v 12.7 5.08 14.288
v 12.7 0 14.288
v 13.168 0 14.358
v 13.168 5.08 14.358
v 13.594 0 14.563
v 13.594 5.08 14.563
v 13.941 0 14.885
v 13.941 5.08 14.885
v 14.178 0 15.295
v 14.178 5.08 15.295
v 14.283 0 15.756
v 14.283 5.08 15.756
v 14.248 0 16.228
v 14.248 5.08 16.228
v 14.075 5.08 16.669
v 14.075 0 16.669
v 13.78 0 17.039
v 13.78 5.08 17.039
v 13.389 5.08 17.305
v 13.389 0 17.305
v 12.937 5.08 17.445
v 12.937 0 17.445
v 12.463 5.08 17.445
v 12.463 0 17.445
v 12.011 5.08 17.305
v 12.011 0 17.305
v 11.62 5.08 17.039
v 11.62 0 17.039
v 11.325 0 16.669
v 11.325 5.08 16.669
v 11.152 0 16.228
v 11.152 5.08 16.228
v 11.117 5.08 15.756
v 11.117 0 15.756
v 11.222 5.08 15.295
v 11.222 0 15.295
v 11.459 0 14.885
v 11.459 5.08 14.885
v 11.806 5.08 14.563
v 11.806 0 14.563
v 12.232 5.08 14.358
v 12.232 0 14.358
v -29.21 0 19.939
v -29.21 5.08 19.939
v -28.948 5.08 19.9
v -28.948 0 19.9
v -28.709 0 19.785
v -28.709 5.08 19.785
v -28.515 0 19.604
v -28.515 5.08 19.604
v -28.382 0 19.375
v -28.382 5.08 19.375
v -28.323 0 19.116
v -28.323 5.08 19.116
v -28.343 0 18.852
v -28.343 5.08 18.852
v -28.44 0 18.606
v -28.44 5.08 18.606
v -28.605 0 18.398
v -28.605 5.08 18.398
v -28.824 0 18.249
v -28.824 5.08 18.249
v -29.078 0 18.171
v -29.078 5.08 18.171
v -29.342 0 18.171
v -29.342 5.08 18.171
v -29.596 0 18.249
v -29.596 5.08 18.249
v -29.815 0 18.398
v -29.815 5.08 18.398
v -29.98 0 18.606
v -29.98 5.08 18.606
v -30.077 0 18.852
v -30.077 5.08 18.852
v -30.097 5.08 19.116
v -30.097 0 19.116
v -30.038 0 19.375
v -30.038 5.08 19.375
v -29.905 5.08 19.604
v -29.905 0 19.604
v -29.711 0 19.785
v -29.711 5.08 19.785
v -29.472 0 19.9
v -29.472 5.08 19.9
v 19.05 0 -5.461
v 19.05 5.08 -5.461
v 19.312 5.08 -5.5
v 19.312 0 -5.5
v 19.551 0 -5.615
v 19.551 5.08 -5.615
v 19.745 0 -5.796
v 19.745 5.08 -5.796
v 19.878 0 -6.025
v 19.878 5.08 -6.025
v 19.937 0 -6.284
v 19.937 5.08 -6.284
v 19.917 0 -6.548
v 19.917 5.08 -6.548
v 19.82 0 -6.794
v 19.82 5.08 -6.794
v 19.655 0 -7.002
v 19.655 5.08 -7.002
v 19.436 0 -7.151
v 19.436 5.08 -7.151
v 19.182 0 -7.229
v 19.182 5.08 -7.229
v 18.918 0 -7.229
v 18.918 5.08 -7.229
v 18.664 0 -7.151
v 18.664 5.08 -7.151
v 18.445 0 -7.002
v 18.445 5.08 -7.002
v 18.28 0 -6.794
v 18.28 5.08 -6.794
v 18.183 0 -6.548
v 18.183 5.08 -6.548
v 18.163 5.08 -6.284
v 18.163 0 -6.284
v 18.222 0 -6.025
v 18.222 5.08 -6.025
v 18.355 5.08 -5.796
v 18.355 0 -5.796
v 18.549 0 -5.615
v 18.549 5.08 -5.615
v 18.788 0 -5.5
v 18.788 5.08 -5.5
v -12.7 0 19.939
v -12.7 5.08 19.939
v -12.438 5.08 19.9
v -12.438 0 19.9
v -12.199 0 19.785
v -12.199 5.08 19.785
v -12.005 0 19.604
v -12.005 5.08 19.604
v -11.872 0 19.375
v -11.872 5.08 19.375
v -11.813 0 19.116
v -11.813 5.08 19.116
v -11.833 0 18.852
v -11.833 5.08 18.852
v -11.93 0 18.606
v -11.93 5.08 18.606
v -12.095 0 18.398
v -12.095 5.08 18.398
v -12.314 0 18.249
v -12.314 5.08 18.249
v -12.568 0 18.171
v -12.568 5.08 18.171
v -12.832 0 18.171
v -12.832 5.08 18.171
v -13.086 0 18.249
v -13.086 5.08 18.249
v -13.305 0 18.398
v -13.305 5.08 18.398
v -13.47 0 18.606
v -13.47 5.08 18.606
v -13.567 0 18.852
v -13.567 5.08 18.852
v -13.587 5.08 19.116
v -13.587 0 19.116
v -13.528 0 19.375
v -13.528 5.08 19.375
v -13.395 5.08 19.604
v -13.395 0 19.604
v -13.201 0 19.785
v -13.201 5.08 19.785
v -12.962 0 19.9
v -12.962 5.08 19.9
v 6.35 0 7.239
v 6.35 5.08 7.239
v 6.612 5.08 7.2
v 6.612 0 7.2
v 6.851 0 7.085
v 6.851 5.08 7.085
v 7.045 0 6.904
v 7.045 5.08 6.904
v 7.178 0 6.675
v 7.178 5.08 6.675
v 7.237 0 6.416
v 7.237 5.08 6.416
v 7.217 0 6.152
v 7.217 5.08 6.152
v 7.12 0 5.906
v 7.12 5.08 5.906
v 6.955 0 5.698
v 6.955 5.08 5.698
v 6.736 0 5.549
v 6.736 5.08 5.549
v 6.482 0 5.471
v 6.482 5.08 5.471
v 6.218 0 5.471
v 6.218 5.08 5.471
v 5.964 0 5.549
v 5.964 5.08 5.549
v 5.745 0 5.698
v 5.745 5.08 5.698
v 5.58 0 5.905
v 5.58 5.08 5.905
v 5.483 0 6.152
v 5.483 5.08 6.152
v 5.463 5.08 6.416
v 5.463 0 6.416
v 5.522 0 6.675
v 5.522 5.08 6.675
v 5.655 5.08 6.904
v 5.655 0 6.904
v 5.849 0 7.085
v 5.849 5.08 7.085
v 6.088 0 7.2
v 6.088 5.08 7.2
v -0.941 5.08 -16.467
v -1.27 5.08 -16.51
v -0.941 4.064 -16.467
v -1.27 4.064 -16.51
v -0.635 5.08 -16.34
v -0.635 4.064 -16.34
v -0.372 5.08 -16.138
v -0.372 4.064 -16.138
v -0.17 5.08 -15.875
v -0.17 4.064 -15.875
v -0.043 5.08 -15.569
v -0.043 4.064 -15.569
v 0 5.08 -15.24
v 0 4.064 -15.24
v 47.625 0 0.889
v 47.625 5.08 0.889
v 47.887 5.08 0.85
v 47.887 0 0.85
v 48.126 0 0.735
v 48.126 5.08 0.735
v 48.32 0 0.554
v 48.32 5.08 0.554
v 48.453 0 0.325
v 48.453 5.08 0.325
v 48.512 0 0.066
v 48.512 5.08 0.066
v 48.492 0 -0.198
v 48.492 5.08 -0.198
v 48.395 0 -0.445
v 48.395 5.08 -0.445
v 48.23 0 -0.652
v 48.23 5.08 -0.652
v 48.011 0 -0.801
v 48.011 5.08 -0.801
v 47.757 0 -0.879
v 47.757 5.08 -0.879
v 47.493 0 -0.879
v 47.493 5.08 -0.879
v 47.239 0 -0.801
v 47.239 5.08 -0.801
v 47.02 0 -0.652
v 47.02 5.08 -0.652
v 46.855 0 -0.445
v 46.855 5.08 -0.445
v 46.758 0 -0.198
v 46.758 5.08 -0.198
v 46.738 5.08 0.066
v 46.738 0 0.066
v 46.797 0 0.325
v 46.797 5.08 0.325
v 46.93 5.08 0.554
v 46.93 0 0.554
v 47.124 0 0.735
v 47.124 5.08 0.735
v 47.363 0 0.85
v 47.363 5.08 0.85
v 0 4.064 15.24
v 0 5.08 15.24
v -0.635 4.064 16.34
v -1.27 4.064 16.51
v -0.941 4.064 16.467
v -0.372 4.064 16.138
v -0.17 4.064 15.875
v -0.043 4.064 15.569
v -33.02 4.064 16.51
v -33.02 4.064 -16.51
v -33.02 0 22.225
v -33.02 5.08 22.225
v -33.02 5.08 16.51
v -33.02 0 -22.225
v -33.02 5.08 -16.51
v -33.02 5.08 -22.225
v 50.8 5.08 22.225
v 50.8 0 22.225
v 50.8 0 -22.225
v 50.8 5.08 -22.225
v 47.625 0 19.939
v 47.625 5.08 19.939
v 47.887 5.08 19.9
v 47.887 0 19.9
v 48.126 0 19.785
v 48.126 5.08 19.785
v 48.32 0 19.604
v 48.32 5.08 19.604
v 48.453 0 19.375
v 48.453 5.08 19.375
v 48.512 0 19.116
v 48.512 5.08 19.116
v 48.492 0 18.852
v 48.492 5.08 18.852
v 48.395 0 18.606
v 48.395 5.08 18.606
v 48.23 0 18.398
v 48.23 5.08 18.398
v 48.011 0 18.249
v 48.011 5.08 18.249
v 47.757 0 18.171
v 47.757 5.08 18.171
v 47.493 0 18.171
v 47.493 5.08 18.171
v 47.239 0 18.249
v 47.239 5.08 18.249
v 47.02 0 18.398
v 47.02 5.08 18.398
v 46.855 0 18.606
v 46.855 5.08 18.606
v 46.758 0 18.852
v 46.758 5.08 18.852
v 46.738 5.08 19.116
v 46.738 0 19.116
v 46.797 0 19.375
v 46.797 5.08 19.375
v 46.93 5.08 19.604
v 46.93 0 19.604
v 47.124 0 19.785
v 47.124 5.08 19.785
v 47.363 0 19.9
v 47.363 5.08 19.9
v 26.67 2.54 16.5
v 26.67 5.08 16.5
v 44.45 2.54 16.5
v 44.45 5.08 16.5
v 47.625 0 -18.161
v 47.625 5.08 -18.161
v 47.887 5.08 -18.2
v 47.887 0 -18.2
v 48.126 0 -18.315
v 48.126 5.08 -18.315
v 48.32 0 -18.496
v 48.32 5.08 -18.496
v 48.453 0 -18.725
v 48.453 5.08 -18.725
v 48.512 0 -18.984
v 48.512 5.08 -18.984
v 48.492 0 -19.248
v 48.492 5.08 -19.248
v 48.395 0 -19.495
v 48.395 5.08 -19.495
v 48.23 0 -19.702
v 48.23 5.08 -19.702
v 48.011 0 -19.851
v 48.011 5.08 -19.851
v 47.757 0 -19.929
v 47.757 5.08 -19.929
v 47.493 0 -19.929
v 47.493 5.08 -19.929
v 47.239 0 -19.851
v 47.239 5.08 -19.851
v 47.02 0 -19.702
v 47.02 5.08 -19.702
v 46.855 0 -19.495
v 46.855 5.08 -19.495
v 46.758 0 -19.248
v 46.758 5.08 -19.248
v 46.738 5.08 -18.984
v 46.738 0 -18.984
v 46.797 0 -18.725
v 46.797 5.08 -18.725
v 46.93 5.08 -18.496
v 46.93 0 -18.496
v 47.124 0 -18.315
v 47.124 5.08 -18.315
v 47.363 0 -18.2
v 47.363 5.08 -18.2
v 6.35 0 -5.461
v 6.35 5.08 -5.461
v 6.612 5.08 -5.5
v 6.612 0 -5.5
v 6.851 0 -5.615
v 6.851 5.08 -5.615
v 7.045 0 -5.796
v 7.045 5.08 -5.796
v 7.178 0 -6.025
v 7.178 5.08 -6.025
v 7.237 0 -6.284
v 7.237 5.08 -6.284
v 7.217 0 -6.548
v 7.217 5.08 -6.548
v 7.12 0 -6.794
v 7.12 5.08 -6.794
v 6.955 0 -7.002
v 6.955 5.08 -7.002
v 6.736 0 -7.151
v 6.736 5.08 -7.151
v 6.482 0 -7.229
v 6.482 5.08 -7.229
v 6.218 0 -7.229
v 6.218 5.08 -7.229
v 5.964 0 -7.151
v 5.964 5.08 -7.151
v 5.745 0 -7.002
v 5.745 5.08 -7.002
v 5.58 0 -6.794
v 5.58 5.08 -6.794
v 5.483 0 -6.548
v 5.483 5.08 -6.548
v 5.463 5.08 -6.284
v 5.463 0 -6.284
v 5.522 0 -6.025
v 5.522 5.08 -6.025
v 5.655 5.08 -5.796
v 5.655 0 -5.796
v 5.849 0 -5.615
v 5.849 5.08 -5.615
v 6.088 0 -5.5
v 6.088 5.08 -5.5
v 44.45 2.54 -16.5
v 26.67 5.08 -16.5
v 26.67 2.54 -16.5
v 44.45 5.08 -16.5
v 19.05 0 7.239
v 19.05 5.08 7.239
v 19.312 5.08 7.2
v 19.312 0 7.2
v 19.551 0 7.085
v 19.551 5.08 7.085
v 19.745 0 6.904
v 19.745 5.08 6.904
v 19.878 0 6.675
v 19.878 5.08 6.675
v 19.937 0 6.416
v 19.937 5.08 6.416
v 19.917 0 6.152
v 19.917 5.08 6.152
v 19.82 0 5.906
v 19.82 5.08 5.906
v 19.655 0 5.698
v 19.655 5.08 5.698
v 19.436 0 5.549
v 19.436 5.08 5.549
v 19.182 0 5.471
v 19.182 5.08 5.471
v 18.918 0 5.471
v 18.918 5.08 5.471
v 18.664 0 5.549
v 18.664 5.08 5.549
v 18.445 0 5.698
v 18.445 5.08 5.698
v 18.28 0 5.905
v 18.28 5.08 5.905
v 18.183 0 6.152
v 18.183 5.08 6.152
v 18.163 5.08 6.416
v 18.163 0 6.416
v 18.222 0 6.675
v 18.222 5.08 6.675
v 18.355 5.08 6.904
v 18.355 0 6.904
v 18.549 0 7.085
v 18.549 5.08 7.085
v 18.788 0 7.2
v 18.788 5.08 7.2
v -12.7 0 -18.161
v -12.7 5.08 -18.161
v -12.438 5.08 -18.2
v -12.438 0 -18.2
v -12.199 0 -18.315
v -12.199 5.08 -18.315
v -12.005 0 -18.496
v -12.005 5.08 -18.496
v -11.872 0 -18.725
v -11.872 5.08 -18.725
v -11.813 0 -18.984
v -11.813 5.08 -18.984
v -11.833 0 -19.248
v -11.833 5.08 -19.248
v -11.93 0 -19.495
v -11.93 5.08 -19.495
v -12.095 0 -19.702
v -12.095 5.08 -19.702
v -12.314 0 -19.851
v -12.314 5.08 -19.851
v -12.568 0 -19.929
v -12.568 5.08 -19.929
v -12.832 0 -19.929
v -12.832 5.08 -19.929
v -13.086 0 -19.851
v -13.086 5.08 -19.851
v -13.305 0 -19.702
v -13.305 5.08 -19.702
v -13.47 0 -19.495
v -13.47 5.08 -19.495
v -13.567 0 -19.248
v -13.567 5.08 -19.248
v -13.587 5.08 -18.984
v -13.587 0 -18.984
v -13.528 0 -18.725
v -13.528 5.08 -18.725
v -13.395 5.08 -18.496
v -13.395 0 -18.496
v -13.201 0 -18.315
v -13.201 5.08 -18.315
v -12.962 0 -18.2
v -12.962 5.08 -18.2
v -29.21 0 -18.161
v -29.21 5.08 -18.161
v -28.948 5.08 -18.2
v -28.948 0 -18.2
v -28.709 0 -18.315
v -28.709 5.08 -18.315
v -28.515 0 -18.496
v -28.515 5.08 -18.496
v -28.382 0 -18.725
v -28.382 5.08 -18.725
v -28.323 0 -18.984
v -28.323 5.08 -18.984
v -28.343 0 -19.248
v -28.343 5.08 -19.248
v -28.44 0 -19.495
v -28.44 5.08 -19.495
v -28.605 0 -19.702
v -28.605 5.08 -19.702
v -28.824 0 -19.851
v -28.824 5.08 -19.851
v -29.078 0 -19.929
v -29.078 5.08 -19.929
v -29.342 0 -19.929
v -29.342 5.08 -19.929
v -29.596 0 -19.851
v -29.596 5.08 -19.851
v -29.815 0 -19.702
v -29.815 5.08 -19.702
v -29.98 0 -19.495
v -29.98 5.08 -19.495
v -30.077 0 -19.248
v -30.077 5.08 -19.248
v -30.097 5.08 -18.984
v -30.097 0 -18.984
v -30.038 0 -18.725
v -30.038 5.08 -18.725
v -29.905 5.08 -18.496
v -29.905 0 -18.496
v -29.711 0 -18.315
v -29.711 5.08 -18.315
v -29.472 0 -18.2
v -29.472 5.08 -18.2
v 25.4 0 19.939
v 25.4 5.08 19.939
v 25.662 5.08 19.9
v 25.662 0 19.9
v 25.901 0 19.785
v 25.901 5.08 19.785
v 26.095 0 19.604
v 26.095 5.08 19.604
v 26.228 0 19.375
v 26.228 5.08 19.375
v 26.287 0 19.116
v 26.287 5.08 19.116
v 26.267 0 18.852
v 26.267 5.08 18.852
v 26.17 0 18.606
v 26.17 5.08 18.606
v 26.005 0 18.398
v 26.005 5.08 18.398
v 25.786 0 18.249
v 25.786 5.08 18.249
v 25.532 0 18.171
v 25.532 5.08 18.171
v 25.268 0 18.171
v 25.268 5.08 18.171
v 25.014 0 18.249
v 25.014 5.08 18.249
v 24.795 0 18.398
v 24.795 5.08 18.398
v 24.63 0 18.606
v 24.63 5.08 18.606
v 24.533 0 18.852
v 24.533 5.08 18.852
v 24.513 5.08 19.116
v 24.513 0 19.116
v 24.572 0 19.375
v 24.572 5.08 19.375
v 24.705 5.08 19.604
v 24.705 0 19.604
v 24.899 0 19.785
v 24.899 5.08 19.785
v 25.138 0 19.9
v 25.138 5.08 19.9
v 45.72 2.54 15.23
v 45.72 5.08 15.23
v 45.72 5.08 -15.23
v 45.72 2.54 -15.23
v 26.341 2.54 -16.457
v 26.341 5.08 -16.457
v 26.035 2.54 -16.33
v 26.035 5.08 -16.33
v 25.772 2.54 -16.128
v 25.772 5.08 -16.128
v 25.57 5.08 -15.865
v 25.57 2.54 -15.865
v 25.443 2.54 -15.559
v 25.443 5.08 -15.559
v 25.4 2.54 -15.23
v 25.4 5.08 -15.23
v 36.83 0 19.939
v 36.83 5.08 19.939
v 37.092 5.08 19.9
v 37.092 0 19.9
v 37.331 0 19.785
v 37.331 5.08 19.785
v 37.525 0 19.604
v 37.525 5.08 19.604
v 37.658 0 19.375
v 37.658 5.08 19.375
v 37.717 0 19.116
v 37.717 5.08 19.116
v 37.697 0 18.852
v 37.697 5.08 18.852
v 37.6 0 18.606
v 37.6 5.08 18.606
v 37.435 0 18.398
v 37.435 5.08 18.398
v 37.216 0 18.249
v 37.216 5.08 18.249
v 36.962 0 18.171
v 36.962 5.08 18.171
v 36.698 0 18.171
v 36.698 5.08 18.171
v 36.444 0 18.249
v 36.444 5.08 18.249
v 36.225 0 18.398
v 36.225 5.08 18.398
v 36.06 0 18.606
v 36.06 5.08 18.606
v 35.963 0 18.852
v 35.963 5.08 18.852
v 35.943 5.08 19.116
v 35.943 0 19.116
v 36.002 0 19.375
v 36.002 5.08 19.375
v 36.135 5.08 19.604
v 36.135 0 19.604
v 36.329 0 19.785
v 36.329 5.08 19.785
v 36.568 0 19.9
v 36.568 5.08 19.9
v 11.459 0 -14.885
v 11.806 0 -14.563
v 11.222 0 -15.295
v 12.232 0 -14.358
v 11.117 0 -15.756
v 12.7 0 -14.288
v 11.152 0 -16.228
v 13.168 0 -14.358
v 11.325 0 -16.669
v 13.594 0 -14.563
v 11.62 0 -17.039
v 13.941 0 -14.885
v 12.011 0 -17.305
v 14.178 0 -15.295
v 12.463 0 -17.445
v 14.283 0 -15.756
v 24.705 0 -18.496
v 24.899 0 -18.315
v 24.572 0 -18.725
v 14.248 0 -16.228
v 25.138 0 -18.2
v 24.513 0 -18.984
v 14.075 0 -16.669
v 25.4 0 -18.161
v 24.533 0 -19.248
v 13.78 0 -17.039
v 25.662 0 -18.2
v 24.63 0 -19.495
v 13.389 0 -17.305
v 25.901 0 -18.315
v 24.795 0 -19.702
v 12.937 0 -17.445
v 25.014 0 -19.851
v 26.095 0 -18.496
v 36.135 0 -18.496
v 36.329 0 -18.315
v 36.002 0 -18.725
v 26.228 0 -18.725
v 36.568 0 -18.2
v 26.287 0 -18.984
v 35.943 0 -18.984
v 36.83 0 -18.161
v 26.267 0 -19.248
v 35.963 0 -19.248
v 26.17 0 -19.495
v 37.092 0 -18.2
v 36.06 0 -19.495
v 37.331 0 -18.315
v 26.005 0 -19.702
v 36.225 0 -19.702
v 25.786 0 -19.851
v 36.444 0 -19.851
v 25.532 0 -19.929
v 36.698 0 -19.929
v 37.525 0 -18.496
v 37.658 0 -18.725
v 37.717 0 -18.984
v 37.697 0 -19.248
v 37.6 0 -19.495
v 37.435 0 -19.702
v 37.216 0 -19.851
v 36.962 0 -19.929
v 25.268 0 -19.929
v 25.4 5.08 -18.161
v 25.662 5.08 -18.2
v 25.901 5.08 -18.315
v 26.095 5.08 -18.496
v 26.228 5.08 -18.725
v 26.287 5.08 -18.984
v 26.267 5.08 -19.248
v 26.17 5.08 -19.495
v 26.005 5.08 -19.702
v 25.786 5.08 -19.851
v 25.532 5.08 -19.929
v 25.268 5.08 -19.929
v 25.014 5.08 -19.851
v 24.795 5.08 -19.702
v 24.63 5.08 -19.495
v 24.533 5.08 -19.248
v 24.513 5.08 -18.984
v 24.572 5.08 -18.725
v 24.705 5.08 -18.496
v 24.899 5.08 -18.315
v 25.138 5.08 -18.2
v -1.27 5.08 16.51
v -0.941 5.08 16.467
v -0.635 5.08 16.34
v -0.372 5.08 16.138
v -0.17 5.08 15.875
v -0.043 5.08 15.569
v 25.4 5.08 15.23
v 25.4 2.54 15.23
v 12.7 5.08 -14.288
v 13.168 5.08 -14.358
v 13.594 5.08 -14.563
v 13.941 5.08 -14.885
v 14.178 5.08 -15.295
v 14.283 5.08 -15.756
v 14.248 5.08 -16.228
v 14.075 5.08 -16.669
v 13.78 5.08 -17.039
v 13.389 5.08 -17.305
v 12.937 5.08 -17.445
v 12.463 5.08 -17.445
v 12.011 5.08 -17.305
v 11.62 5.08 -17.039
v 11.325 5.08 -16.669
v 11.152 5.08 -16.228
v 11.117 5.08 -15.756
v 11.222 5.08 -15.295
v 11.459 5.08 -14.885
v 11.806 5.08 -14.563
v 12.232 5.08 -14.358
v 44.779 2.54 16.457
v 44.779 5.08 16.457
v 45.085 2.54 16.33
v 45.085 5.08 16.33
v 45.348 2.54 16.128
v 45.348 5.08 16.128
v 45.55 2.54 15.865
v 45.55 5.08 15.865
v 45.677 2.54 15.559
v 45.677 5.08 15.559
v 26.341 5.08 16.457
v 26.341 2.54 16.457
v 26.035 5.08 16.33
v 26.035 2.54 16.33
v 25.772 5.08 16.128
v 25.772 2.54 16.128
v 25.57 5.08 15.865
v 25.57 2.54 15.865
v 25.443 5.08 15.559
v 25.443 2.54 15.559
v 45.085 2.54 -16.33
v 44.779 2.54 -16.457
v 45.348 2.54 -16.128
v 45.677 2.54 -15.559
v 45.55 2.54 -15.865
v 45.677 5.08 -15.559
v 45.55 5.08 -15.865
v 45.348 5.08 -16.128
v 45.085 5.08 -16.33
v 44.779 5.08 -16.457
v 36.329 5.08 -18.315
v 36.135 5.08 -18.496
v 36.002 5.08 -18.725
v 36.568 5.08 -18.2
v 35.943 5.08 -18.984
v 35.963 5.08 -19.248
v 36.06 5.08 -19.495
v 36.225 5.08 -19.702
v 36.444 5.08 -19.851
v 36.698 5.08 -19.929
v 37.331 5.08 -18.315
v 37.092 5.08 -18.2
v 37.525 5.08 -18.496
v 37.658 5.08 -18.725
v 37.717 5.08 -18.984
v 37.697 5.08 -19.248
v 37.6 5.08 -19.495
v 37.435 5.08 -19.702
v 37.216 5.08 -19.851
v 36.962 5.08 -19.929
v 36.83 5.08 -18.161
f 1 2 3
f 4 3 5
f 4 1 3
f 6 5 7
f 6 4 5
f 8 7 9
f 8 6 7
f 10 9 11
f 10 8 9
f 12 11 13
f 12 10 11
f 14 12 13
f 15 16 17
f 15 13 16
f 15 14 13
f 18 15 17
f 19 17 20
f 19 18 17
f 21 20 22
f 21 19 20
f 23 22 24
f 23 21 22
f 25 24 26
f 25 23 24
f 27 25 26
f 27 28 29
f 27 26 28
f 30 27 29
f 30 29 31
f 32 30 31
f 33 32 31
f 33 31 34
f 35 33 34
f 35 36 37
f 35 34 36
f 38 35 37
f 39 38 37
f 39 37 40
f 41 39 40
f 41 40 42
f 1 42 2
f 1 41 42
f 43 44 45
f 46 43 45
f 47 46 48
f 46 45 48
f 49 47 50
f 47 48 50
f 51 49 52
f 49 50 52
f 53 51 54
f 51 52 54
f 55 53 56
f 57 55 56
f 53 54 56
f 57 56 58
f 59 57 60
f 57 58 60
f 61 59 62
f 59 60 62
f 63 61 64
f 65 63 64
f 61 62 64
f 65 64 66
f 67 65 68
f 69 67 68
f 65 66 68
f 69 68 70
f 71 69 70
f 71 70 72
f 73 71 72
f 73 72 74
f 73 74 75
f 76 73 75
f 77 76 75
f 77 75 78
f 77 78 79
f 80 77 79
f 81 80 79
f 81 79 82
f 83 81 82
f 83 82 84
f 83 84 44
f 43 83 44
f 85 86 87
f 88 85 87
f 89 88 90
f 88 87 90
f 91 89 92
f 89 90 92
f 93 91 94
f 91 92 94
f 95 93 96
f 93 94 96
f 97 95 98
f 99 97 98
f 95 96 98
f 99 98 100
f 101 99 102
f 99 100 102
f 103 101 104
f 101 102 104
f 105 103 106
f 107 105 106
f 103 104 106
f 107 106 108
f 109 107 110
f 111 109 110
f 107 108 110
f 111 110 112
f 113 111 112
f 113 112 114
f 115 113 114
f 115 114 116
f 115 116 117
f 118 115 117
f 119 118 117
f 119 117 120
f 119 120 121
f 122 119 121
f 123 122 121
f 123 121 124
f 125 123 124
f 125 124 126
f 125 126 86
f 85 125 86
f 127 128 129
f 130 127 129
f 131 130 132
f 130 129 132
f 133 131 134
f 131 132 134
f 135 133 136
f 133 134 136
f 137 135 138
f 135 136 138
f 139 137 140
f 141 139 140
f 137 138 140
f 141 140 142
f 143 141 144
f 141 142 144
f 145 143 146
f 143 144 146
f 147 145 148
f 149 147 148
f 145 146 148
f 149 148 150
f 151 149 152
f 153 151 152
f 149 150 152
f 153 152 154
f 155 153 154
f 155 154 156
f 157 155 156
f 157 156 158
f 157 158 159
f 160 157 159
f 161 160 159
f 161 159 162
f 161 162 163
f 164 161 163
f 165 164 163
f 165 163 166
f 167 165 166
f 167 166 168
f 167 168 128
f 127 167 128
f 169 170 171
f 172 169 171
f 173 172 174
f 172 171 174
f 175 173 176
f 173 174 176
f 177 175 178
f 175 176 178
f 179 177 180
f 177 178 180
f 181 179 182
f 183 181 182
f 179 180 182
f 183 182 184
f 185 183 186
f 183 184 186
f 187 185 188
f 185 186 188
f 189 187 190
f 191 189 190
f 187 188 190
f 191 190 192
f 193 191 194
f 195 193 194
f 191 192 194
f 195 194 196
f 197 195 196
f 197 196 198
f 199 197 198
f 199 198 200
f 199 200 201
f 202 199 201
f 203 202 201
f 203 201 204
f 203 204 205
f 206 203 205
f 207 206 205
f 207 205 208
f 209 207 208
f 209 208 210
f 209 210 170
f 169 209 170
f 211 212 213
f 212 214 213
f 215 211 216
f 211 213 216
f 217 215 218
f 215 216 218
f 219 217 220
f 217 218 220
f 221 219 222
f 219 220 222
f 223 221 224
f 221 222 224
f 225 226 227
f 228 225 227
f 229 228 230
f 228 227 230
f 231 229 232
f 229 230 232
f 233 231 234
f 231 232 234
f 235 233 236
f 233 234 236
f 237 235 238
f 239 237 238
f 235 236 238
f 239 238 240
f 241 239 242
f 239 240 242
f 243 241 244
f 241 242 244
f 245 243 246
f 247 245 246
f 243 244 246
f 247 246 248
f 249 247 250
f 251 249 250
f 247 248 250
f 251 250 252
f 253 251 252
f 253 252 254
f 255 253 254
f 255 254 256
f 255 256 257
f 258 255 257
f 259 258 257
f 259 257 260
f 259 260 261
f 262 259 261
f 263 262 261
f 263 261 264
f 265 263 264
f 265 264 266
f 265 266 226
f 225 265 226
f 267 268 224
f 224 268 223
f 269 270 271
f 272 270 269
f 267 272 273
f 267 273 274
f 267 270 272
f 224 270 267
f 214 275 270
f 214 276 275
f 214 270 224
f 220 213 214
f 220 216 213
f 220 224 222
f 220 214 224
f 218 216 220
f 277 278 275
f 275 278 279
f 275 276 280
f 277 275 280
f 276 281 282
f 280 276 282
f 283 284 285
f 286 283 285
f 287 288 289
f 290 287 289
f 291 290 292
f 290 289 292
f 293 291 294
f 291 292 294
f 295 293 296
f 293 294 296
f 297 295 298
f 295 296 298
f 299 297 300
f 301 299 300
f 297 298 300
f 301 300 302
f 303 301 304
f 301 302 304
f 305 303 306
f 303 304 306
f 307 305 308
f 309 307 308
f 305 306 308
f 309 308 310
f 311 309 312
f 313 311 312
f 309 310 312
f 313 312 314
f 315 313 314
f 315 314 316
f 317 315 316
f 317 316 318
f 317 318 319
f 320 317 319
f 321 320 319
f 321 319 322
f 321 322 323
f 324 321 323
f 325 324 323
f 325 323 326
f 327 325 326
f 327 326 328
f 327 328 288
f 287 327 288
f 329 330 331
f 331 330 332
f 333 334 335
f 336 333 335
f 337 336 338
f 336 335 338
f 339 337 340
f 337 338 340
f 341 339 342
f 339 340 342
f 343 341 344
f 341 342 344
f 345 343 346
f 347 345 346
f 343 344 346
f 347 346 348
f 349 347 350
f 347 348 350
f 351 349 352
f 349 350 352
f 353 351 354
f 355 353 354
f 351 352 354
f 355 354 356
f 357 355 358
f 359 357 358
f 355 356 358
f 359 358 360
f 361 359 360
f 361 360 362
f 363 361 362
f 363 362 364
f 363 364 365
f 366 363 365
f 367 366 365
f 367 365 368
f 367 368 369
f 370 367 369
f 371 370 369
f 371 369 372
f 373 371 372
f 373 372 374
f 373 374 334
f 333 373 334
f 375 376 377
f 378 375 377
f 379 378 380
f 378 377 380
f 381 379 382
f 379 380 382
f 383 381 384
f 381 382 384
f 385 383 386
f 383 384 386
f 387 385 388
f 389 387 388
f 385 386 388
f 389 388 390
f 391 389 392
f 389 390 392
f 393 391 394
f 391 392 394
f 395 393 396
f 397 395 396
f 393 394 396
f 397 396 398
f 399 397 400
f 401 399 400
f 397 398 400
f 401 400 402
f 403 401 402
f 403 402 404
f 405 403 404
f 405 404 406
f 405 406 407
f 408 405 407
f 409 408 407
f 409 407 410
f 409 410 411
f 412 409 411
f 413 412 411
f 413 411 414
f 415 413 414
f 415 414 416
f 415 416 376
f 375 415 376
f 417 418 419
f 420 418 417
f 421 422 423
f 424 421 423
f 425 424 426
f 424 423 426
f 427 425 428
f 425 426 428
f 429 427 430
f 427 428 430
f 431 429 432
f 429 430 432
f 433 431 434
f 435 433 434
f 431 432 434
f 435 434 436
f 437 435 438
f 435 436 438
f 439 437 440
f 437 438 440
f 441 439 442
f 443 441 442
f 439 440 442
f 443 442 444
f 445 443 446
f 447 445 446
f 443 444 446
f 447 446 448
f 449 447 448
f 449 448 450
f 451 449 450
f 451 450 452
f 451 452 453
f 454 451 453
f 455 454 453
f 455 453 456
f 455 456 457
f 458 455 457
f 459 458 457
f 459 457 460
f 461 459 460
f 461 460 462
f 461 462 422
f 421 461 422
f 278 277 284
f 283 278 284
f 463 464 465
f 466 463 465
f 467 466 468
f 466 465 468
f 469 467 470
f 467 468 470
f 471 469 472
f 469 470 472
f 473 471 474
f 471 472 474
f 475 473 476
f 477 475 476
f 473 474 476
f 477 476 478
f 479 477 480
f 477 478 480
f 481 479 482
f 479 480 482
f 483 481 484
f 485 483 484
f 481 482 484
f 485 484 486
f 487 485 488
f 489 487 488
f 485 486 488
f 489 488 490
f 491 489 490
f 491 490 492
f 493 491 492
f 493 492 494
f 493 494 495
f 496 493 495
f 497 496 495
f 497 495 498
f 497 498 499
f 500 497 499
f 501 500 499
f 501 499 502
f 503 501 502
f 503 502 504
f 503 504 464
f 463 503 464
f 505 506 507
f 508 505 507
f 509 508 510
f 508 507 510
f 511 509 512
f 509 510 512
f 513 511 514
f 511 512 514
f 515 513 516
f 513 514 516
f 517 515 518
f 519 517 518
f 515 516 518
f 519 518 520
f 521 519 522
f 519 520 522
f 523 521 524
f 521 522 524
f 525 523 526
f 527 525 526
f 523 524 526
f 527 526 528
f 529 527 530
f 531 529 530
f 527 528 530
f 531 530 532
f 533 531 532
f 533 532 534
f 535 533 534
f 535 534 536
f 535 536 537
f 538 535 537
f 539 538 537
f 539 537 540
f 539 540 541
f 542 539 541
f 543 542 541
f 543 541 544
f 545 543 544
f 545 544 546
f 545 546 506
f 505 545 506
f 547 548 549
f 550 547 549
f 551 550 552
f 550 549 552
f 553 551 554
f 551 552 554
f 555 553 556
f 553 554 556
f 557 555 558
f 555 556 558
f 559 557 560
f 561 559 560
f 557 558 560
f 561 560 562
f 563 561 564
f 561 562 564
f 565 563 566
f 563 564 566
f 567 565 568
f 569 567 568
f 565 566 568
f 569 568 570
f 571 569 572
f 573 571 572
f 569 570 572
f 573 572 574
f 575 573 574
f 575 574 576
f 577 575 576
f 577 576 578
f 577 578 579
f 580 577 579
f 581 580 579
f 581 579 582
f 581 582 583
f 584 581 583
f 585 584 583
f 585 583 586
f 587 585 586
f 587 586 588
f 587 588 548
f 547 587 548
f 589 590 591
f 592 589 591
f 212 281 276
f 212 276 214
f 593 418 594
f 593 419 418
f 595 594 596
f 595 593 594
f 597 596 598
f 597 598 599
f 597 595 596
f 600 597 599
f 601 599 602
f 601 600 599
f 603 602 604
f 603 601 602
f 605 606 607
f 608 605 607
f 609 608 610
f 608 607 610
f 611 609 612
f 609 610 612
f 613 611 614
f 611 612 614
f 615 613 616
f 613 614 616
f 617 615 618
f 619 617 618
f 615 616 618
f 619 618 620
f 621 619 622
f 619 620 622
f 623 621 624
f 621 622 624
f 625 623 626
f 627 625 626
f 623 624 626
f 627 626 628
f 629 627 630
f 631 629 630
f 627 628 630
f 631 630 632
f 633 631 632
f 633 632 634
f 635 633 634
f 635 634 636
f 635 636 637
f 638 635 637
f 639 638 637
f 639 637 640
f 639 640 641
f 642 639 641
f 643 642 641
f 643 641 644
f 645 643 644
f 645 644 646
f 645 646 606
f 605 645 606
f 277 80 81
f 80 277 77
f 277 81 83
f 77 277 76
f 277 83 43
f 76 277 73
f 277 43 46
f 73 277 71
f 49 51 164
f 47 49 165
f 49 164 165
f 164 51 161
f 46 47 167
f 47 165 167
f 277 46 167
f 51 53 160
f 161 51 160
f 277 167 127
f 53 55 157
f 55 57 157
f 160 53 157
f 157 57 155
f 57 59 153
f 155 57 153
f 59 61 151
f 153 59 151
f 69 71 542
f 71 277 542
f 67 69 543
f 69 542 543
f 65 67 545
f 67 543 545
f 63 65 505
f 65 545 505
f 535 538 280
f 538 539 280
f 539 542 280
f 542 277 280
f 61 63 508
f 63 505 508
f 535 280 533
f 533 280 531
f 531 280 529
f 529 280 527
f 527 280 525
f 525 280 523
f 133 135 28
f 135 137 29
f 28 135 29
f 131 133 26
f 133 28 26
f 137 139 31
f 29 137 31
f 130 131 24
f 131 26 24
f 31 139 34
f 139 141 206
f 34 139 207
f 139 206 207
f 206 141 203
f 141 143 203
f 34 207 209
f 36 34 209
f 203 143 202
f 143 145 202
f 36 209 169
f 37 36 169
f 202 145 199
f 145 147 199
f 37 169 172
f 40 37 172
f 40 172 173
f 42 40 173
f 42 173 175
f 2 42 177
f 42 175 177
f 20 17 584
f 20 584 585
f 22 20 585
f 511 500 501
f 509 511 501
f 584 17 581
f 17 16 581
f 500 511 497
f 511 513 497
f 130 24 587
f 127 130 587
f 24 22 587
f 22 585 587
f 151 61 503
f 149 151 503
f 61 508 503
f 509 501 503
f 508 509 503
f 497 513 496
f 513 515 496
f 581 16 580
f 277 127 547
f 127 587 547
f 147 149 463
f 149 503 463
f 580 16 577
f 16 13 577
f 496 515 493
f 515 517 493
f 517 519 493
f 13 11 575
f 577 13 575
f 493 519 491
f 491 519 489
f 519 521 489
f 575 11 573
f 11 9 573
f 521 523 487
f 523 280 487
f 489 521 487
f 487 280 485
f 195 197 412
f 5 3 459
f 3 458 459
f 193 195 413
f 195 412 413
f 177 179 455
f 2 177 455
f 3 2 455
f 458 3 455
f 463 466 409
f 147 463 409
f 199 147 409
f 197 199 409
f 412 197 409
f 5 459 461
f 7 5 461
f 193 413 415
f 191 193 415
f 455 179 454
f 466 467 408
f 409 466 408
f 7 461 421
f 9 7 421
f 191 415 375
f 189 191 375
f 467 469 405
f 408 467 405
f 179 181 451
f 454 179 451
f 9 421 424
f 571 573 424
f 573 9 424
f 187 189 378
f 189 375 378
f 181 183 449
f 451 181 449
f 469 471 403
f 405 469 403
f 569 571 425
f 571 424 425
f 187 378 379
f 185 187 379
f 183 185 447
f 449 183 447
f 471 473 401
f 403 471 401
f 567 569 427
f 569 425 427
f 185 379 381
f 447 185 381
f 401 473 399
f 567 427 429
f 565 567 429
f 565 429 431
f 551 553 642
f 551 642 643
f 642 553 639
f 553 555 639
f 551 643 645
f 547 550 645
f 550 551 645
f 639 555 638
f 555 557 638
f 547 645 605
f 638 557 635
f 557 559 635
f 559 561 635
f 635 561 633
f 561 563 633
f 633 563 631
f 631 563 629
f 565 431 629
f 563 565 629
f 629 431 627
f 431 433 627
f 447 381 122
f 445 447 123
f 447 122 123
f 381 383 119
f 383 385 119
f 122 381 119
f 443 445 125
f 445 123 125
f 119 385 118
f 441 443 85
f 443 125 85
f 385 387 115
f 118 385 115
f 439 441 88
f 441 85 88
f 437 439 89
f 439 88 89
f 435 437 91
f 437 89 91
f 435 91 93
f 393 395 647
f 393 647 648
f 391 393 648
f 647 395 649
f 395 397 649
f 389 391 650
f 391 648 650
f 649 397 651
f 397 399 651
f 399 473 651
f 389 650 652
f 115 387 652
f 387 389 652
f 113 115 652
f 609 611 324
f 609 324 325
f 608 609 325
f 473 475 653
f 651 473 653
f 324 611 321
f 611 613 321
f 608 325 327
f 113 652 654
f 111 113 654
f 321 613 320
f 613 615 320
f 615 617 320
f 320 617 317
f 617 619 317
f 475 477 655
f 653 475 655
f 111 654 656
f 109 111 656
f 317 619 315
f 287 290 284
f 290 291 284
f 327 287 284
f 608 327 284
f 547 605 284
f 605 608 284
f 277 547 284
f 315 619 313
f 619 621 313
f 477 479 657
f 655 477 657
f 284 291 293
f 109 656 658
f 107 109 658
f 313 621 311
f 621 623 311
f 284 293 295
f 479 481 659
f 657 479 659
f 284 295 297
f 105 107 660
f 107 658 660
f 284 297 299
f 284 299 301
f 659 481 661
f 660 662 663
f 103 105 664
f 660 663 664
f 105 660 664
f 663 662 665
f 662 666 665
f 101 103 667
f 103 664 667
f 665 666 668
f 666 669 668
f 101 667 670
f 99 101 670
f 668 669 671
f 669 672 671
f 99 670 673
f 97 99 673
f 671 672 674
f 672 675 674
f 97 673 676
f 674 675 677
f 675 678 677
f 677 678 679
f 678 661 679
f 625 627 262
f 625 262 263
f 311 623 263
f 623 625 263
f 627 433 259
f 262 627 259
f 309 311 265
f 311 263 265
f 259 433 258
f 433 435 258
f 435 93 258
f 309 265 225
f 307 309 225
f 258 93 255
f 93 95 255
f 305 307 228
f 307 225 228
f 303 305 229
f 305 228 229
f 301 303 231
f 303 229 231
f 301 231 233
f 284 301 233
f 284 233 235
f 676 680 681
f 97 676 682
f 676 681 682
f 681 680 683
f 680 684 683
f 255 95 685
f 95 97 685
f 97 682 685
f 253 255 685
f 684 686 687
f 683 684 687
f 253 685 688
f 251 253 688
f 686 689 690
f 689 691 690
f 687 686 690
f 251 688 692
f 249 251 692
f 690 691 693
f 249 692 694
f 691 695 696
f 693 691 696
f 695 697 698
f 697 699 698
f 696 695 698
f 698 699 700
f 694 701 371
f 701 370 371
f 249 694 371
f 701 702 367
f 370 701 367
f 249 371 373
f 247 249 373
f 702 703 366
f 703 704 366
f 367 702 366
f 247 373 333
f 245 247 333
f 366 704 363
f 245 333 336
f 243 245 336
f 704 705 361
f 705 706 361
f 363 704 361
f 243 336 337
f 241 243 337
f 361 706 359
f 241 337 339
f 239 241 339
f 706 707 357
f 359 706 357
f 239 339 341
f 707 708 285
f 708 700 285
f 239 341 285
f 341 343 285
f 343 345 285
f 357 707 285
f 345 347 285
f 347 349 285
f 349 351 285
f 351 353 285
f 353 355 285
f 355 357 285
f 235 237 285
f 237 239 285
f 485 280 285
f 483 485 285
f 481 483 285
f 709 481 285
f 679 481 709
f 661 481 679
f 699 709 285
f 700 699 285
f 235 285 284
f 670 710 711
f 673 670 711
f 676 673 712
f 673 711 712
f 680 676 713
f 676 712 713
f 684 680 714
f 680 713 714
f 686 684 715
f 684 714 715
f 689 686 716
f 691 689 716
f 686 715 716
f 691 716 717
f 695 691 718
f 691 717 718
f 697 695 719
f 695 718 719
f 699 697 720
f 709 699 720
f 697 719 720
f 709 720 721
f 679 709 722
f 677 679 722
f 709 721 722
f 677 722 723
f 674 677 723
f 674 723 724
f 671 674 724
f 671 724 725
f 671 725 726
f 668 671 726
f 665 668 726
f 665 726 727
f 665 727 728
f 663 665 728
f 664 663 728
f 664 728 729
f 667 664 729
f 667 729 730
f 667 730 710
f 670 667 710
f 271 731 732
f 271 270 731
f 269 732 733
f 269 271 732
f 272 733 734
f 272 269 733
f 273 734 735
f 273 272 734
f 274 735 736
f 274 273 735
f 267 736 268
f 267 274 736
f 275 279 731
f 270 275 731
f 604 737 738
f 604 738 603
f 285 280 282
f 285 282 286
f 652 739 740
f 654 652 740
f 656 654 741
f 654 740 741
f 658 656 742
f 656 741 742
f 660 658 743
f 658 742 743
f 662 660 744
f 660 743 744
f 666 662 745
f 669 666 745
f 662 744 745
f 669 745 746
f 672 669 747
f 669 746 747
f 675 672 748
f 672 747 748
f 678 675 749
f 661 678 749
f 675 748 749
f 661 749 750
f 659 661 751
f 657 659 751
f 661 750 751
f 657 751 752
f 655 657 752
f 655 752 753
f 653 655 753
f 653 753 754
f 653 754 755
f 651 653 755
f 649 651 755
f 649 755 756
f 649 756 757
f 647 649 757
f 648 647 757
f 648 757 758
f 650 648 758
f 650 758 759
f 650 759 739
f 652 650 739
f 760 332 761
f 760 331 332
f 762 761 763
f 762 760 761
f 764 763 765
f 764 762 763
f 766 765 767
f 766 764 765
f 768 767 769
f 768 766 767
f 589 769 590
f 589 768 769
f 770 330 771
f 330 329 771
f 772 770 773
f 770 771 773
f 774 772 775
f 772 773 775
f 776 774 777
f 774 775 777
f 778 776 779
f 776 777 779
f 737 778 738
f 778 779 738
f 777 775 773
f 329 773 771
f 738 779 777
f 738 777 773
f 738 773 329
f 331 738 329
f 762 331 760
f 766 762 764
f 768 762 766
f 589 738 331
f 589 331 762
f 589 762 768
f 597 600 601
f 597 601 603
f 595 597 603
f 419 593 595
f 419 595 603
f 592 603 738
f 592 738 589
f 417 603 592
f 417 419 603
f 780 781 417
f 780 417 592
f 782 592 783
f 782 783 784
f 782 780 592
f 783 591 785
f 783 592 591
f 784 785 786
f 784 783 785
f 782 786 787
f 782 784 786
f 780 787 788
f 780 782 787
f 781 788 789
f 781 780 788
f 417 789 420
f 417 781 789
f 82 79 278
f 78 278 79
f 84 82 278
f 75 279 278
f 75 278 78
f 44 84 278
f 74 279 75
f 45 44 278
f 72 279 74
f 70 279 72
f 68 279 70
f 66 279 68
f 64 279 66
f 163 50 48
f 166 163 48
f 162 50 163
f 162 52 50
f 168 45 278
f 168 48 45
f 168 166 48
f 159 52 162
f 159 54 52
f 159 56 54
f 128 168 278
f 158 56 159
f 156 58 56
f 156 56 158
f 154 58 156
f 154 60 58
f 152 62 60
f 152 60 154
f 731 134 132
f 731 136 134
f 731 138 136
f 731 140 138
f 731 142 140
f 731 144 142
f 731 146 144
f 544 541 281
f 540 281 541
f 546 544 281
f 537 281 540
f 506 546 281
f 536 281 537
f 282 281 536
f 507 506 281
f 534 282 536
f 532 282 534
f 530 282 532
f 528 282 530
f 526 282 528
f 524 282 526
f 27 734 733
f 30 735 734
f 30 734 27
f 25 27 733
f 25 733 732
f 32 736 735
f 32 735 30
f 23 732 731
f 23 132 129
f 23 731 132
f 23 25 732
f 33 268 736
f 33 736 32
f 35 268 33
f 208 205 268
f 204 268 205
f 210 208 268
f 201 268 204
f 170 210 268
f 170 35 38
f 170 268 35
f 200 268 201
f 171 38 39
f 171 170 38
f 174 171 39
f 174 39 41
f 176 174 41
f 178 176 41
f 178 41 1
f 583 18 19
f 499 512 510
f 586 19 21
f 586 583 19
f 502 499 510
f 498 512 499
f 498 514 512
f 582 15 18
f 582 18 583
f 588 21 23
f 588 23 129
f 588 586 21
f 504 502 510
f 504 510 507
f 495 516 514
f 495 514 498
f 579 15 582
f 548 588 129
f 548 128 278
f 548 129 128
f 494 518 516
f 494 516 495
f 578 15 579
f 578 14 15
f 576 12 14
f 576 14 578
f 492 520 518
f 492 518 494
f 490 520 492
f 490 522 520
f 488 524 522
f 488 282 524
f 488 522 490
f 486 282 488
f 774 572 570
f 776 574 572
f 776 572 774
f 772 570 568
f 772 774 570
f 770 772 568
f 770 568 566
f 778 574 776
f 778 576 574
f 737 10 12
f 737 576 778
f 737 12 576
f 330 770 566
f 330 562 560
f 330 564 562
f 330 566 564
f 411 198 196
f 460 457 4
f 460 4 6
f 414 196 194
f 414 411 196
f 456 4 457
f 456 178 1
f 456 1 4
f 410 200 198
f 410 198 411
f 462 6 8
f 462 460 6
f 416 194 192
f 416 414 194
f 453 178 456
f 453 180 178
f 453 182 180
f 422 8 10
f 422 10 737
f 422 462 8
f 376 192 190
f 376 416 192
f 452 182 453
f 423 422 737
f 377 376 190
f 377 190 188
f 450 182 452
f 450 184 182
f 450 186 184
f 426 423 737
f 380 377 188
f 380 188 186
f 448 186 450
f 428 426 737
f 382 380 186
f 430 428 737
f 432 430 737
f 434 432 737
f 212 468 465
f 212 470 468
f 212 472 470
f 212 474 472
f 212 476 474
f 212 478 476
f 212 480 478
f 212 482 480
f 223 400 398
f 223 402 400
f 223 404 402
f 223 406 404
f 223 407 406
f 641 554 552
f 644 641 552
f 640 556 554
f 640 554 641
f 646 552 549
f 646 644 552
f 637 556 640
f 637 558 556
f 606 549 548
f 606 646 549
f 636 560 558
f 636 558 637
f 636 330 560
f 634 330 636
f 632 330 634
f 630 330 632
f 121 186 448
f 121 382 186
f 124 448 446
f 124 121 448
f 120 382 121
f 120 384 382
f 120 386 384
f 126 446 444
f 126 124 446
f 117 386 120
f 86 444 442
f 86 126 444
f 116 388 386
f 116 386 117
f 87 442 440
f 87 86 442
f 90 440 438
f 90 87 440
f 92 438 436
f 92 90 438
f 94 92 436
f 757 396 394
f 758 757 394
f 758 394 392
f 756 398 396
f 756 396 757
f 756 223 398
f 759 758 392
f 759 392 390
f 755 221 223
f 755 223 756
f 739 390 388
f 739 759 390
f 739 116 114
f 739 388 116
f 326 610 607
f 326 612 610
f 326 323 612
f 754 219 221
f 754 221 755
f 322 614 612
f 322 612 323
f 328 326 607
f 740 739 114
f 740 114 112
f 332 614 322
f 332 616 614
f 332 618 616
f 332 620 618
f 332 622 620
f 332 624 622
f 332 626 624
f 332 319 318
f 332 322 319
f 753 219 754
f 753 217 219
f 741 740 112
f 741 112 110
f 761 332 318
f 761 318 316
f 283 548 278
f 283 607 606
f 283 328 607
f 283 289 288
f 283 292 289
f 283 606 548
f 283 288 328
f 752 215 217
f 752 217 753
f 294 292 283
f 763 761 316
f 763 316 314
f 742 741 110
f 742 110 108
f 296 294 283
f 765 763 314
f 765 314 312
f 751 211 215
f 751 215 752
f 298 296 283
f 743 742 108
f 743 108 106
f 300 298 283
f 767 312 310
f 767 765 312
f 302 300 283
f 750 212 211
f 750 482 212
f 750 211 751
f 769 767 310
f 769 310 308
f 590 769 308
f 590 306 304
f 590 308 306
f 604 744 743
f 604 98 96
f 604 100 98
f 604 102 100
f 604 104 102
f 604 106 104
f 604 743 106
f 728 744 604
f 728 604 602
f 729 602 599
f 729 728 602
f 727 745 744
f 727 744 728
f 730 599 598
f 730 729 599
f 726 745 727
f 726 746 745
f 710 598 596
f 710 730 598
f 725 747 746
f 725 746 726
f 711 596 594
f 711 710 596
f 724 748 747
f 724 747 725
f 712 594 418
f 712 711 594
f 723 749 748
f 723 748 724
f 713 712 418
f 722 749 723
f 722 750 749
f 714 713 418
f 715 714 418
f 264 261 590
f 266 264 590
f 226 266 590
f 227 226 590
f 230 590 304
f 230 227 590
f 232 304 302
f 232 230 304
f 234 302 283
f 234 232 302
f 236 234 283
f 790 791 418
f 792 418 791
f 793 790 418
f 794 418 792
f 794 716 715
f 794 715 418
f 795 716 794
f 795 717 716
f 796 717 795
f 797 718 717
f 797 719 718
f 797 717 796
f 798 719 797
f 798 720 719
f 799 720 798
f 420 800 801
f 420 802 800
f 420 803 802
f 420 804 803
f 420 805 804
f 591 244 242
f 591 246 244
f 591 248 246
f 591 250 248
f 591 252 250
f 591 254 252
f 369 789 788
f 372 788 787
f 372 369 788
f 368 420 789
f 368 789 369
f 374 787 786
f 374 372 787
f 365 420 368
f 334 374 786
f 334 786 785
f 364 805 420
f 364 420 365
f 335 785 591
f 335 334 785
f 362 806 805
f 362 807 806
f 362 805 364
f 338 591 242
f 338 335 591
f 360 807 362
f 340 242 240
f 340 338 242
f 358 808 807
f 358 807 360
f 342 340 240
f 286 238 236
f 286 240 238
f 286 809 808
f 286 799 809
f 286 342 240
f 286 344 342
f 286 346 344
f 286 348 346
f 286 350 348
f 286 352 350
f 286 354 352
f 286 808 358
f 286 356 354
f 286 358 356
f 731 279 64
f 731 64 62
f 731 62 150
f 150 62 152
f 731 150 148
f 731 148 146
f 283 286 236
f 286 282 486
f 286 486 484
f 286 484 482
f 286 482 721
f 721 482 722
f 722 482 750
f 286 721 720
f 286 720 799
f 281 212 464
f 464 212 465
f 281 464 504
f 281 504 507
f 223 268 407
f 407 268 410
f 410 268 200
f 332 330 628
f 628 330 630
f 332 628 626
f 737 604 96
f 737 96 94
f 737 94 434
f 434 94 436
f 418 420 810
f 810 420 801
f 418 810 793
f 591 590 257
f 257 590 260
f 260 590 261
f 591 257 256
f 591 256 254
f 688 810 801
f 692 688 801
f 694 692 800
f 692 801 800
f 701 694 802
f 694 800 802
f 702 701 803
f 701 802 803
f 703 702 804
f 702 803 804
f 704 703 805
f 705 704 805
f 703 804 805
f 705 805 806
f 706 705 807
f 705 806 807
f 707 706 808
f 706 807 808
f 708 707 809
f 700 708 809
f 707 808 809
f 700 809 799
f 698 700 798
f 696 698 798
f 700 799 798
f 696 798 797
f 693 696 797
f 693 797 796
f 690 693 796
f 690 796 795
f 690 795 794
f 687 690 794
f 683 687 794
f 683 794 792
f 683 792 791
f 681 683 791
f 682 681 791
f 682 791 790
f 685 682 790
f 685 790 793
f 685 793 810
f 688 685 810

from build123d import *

# Parameters (mm, degrees)
SKETCH1_W           = 101.6
SKETCH1_H           = 44.45
BOSS_EXTRUDE1_DEPTH = 5.08
SKETCH2_R           = 0.889
CUT_EXTRUDE1_DEPTH  = 56.681208904
SKETCH3_R           = 1.2192
SKETCH3_R_2         = 1.5875
CUT_EXTRUDE2_DEPTH  = 56.681208904
SKETCH4_W           = 17.78
SKETCH4_H           = 34.036
CUT_EXTRUDE3_DEPTH  = 56.681208904
FILLET2_R           = 2.54
SKETCH5_W           = 17.78
SKETCH5_H           = 44.45
CUT_EXTRUDE4_DEPTH  = 56.681208904
SKETCH6_W           = 33.02
SKETCH6_H           = 33.02
CUT_EXTRUDE5_DEPTH  = 1.016
FILLET3_R           = 1.27
SKETCH7_W           = 20.32
SKETCH7_H           = 33
CUT_EXTRUDE6_DEPTH  = 2.54
FILLET4_R           = 1.27


with BuildPart() as part:
    # Sketch1 → Boss-Extrude1 (new body)
    with BuildSketch(Plane(origin=(0, 0, 0), x_dir=(1, 0, 0), z_dir=(0, 1, 0))):
        Rectangle(SKETCH1_W, SKETCH1_H)
    extrude(amount=BOSS_EXTRUDE1_DEPTH)

    # Sketch2 → Cut-Extrude1 (cut, through all)
    with BuildSketch(Plane(origin=(0, 5.08, 0), x_dir=(1, 0, 0), z_dir=(0, 1, 0))):
        with Locations(Location((-46.99, 19.05, 0), (0, 0, 270))):
            Circle(SKETCH2_R)
        with Locations(Location((-29.21, 19.05, 0), (0, 0, 270))):
            Circle(SKETCH2_R)
        with Locations(Location((-12.7, 19.05, 0), (0, 0, 270))):
            Circle(SKETCH2_R)
        with Locations(Location((25.4, 19.05, 0), (0, 0, 270))):
            Circle(SKETCH2_R)
        with Locations(Location((36.83, 19.05, 0), (0, 0, 270))):
            Circle(SKETCH2_R)
        with Locations(Location((47.625, 19.05, 0), (0, 0, 270))):
            Circle(SKETCH2_R)
        with Locations(Location((47.625, 0, 0), (0, 0, 270))):
            Circle(SKETCH2_R)
        with Locations(Location((47.625, -19.05, 0), (0, 0, 270))):
            Circle(SKETCH2_R)
        with Locations(Location((36.83, -19.05, 0), (0, 0, 270))):
            Circle(SKETCH2_R)
        with Locations(Location((25.4, -19.05, 0), (0, 0, 270))):
            Circle(SKETCH2_R)
        with Locations(Location((-12.7, -19.05, 0), (0, 0, 270))):
            Circle(SKETCH2_R)
        with Locations(Location((-29.21, -19.05, 0), (0, 0, 270))):
            Circle(SKETCH2_R)
        with Locations(Location((-46.99, -19.05, 0), (0, 0, 270))):
            Circle(SKETCH2_R)
        with Locations(Location((19.05, -6.35, 0), (0, 0, 270))):
            Circle(SKETCH2_R)
        with Locations(Location((19.05, 6.35, 0), (0, 0, 270))):
            Circle(SKETCH2_R)
        with Locations(Location((6.35, 6.35, 0), (0, 0, 270))):
            Circle(SKETCH2_R)
        with Locations(Location((6.35, -6.35, 0), (0, 0, 270))):
            Circle(SKETCH2_R)
    extrude(amount=-CUT_EXTRUDE1_DEPTH, mode=Mode.SUBTRACT)

    # Sketch3 → Cut-Extrude2 (cut, through all)
    with BuildSketch(Plane(origin=(0, 5.08, 0), x_dir=(1, 0, 0), z_dir=(0, 1, 0))):
        with Locations(Location((-37.846, 19.3294, 0), (0, 0, 270))):
            Circle(SKETCH3_R)
        with Locations(Location((12.7, 15.875, 0), (0, 0, 270))):
            Circle(SKETCH3_R_2)
    cut_extrude2 = extrude(amount=-CUT_EXTRUDE2_DEPTH, mode=Mode.SUBTRACT)

    # Mirror1: Cut-Extrude2 across plane
    add(cut_extrude2.mirror(Plane.XY), mode=Mode.SUBTRACT)

    # Sketch4 → Cut-Extrude3 (cut, through all)
    with BuildSketch(Plane(origin=(0, 5.08, 0), x_dir=(1, 0, 0), z_dir=(0, 1, 0))):
        with Locations((-41.91, 0)):
            Rectangle(SKETCH4_W, SKETCH4_H)
    extrude(amount=-CUT_EXTRUDE3_DEPTH, mode=Mode.SUBTRACT)

    # Fillet2
    fillet2_edges = [part.edges().sort_by_distance(p)[0] for p in [
        (-33.02, 2.54, -17.018),
        (-33.02, 2.54, 17.018),
    ]]
    fillet(fillet2_edges, radius=FILLET2_R)

    # Sketch5 → Cut-Extrude4 (cut, through all)
    with BuildSketch(Plane(origin=(0, 5.08, 0), x_dir=(1, 0, 0), z_dir=(0, 1, 0))):
        with Locations((-41.91, 0)):
            Rectangle(SKETCH5_W, SKETCH5_H)
    extrude(amount=-CUT_EXTRUDE4_DEPTH, mode=Mode.SUBTRACT)

    # Sketch6 → Cut-Extrude5 (cut)
    with BuildSketch(Plane(origin=(0, 5.08, 0), x_dir=(1, 0, 0), z_dir=(0, 1, 0))):
        with Locations((-16.51, 0)):
            Rectangle(SKETCH6_W, SKETCH6_H)
    extrude(amount=-CUT_EXTRUDE5_DEPTH, mode=Mode.SUBTRACT)

    # Fillet3
    fillet3_edges = [part.edges().sort_by_distance(p)[0] for p in [
        (0, 4.572, -16.51),
        (0, 4.572, 16.51),
    ]]
    fillet(fillet3_edges, radius=FILLET3_R)

    # Sketch7 → Cut-Extrude6 (cut)
    with BuildSketch(Plane(origin=(0, 5.08, 0), x_dir=(1, 0, 0), z_dir=(0, 1, 0))):
        with Locations((35.56, 0)):
            Rectangle(SKETCH7_W, SKETCH7_H)
    extrude(amount=-CUT_EXTRUDE6_DEPTH, mode=Mode.SUBTRACT)

    # Fillet4
    fillet4_edges = [part.edges().sort_by_distance(p)[0] for p in [
        (45.72, 3.81, -16.5),
        (45.72, 3.81, 16.5),
        (25.4, 3.81, 16.5),
        (25.4, 3.81, -16.5),
    ]]
    fillet(fillet4_edges, radius=FILLET4_R)


solid = part.part
